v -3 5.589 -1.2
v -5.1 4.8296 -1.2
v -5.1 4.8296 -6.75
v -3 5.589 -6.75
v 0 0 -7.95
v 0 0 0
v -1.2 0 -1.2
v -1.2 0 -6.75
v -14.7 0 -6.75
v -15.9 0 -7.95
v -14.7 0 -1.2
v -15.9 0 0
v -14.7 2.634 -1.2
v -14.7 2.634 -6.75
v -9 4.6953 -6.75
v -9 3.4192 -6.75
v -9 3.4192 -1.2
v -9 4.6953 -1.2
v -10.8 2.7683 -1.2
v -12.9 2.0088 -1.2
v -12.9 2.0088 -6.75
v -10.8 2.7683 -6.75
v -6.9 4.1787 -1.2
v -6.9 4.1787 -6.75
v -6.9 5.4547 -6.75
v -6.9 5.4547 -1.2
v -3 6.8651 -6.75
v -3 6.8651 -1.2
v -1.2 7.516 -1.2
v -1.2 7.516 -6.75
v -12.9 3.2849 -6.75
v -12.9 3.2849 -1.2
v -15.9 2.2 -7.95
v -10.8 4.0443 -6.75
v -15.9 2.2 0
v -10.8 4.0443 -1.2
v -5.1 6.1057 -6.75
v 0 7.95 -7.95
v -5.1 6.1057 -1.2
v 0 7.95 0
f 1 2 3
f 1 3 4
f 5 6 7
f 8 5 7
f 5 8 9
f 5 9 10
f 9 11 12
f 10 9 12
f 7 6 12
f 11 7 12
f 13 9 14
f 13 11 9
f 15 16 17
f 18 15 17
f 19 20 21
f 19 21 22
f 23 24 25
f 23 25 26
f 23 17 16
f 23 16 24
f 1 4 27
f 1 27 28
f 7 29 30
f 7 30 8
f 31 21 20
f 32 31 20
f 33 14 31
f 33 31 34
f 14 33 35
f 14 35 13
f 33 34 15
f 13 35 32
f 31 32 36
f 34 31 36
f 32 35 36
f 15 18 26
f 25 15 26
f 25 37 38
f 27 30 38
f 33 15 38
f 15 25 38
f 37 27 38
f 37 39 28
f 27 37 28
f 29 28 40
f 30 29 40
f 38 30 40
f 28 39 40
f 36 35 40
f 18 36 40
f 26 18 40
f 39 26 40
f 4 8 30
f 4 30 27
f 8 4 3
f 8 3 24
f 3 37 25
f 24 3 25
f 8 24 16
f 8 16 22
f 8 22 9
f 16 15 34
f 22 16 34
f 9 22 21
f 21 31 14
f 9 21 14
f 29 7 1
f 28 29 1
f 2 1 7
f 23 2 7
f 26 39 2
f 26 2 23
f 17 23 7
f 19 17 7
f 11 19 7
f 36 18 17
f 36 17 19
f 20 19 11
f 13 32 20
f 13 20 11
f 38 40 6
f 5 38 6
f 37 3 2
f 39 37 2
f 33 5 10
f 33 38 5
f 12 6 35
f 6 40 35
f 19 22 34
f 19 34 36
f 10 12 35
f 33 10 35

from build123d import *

# Parameters (mm, degrees)
BOSS_EXTRUDE1_DEPTH = 7.95
SHELL1_T            = -1.2
SKETCH2_W           = 1.8
SKETCH2_H           = 5.55
CUT_EXTRUDE1_DEPTH  = 20.473443455
LPATTERN1_COUNT     = 4
LPATTERN1_PITCH     = 3.9


with BuildPart() as part:
    # Sketch1 → Boss-Extrude1 (new body)
    with BuildSketch(Plane.XY):
        Polygon((0, 0), (-15.9, 0), (-15.9, 2.2), (0, 7.95), align=None)
    extrude(amount=-BOSS_EXTRUDE1_DEPTH)

    # Shell1
    shell1_openings = [part.faces().sort_by_distance(p)[0] for p in [
        (-7.95, 0, -3.975),
    ]]
    offset(amount=SHELL1_T, openings=shell1_openings, kind=Kind.INTERSECTION)

    # Sketch2 → Cut-Extrude1 (cut, through all)
    with BuildSketch(Plane.XZ):
        with Locations((-13.8, -3.975)):
            Rectangle(SKETCH2_W, SKETCH2_H)
    cut_extrude1 = extrude(amount=-CUT_EXTRUDE1_DEPTH, mode=Mode.SUBTRACT)

    # LPattern1: Cut-Extrude1 ×4
    with Locations(*[(i * LPATTERN1_PITCH, 0, 0) for i in range(1, LPATTERN1_COUNT)]):
        add(cut_extrude1, mode=Mode.SUBTRACT)


solid = part.part
